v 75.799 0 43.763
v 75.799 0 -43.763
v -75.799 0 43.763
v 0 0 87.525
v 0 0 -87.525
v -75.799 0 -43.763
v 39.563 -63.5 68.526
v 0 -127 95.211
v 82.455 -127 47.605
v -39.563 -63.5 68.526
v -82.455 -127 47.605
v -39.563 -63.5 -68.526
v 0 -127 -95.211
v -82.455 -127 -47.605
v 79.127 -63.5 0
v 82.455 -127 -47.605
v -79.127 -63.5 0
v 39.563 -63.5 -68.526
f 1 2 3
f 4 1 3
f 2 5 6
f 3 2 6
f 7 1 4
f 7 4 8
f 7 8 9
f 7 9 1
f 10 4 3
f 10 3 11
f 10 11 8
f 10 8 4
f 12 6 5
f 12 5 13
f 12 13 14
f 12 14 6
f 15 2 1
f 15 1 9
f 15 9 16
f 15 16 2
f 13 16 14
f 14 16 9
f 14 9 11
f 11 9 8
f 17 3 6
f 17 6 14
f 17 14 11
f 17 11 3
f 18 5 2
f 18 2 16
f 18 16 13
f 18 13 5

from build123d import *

# Parameters (mm, degrees)
F1_DEPTH = 127
F1_TAPER = -3


with BuildPart() as f1:
    # F0 (on Front) → F1 (new body)
    with BuildSketch(Plane.XZ):
        Polygon((75.7989510894, -43.7625448157), (75.7989510894, 43.7625448157), (0, 87.5250896315), (-75.7989510894, 43.7625448157), (-75.7989510894, -43.7625448157), (0, -87.5250896315), align=None)
    extrude(amount=F1_DEPTH, taper=F1_TAPER)


solid = f1.part
